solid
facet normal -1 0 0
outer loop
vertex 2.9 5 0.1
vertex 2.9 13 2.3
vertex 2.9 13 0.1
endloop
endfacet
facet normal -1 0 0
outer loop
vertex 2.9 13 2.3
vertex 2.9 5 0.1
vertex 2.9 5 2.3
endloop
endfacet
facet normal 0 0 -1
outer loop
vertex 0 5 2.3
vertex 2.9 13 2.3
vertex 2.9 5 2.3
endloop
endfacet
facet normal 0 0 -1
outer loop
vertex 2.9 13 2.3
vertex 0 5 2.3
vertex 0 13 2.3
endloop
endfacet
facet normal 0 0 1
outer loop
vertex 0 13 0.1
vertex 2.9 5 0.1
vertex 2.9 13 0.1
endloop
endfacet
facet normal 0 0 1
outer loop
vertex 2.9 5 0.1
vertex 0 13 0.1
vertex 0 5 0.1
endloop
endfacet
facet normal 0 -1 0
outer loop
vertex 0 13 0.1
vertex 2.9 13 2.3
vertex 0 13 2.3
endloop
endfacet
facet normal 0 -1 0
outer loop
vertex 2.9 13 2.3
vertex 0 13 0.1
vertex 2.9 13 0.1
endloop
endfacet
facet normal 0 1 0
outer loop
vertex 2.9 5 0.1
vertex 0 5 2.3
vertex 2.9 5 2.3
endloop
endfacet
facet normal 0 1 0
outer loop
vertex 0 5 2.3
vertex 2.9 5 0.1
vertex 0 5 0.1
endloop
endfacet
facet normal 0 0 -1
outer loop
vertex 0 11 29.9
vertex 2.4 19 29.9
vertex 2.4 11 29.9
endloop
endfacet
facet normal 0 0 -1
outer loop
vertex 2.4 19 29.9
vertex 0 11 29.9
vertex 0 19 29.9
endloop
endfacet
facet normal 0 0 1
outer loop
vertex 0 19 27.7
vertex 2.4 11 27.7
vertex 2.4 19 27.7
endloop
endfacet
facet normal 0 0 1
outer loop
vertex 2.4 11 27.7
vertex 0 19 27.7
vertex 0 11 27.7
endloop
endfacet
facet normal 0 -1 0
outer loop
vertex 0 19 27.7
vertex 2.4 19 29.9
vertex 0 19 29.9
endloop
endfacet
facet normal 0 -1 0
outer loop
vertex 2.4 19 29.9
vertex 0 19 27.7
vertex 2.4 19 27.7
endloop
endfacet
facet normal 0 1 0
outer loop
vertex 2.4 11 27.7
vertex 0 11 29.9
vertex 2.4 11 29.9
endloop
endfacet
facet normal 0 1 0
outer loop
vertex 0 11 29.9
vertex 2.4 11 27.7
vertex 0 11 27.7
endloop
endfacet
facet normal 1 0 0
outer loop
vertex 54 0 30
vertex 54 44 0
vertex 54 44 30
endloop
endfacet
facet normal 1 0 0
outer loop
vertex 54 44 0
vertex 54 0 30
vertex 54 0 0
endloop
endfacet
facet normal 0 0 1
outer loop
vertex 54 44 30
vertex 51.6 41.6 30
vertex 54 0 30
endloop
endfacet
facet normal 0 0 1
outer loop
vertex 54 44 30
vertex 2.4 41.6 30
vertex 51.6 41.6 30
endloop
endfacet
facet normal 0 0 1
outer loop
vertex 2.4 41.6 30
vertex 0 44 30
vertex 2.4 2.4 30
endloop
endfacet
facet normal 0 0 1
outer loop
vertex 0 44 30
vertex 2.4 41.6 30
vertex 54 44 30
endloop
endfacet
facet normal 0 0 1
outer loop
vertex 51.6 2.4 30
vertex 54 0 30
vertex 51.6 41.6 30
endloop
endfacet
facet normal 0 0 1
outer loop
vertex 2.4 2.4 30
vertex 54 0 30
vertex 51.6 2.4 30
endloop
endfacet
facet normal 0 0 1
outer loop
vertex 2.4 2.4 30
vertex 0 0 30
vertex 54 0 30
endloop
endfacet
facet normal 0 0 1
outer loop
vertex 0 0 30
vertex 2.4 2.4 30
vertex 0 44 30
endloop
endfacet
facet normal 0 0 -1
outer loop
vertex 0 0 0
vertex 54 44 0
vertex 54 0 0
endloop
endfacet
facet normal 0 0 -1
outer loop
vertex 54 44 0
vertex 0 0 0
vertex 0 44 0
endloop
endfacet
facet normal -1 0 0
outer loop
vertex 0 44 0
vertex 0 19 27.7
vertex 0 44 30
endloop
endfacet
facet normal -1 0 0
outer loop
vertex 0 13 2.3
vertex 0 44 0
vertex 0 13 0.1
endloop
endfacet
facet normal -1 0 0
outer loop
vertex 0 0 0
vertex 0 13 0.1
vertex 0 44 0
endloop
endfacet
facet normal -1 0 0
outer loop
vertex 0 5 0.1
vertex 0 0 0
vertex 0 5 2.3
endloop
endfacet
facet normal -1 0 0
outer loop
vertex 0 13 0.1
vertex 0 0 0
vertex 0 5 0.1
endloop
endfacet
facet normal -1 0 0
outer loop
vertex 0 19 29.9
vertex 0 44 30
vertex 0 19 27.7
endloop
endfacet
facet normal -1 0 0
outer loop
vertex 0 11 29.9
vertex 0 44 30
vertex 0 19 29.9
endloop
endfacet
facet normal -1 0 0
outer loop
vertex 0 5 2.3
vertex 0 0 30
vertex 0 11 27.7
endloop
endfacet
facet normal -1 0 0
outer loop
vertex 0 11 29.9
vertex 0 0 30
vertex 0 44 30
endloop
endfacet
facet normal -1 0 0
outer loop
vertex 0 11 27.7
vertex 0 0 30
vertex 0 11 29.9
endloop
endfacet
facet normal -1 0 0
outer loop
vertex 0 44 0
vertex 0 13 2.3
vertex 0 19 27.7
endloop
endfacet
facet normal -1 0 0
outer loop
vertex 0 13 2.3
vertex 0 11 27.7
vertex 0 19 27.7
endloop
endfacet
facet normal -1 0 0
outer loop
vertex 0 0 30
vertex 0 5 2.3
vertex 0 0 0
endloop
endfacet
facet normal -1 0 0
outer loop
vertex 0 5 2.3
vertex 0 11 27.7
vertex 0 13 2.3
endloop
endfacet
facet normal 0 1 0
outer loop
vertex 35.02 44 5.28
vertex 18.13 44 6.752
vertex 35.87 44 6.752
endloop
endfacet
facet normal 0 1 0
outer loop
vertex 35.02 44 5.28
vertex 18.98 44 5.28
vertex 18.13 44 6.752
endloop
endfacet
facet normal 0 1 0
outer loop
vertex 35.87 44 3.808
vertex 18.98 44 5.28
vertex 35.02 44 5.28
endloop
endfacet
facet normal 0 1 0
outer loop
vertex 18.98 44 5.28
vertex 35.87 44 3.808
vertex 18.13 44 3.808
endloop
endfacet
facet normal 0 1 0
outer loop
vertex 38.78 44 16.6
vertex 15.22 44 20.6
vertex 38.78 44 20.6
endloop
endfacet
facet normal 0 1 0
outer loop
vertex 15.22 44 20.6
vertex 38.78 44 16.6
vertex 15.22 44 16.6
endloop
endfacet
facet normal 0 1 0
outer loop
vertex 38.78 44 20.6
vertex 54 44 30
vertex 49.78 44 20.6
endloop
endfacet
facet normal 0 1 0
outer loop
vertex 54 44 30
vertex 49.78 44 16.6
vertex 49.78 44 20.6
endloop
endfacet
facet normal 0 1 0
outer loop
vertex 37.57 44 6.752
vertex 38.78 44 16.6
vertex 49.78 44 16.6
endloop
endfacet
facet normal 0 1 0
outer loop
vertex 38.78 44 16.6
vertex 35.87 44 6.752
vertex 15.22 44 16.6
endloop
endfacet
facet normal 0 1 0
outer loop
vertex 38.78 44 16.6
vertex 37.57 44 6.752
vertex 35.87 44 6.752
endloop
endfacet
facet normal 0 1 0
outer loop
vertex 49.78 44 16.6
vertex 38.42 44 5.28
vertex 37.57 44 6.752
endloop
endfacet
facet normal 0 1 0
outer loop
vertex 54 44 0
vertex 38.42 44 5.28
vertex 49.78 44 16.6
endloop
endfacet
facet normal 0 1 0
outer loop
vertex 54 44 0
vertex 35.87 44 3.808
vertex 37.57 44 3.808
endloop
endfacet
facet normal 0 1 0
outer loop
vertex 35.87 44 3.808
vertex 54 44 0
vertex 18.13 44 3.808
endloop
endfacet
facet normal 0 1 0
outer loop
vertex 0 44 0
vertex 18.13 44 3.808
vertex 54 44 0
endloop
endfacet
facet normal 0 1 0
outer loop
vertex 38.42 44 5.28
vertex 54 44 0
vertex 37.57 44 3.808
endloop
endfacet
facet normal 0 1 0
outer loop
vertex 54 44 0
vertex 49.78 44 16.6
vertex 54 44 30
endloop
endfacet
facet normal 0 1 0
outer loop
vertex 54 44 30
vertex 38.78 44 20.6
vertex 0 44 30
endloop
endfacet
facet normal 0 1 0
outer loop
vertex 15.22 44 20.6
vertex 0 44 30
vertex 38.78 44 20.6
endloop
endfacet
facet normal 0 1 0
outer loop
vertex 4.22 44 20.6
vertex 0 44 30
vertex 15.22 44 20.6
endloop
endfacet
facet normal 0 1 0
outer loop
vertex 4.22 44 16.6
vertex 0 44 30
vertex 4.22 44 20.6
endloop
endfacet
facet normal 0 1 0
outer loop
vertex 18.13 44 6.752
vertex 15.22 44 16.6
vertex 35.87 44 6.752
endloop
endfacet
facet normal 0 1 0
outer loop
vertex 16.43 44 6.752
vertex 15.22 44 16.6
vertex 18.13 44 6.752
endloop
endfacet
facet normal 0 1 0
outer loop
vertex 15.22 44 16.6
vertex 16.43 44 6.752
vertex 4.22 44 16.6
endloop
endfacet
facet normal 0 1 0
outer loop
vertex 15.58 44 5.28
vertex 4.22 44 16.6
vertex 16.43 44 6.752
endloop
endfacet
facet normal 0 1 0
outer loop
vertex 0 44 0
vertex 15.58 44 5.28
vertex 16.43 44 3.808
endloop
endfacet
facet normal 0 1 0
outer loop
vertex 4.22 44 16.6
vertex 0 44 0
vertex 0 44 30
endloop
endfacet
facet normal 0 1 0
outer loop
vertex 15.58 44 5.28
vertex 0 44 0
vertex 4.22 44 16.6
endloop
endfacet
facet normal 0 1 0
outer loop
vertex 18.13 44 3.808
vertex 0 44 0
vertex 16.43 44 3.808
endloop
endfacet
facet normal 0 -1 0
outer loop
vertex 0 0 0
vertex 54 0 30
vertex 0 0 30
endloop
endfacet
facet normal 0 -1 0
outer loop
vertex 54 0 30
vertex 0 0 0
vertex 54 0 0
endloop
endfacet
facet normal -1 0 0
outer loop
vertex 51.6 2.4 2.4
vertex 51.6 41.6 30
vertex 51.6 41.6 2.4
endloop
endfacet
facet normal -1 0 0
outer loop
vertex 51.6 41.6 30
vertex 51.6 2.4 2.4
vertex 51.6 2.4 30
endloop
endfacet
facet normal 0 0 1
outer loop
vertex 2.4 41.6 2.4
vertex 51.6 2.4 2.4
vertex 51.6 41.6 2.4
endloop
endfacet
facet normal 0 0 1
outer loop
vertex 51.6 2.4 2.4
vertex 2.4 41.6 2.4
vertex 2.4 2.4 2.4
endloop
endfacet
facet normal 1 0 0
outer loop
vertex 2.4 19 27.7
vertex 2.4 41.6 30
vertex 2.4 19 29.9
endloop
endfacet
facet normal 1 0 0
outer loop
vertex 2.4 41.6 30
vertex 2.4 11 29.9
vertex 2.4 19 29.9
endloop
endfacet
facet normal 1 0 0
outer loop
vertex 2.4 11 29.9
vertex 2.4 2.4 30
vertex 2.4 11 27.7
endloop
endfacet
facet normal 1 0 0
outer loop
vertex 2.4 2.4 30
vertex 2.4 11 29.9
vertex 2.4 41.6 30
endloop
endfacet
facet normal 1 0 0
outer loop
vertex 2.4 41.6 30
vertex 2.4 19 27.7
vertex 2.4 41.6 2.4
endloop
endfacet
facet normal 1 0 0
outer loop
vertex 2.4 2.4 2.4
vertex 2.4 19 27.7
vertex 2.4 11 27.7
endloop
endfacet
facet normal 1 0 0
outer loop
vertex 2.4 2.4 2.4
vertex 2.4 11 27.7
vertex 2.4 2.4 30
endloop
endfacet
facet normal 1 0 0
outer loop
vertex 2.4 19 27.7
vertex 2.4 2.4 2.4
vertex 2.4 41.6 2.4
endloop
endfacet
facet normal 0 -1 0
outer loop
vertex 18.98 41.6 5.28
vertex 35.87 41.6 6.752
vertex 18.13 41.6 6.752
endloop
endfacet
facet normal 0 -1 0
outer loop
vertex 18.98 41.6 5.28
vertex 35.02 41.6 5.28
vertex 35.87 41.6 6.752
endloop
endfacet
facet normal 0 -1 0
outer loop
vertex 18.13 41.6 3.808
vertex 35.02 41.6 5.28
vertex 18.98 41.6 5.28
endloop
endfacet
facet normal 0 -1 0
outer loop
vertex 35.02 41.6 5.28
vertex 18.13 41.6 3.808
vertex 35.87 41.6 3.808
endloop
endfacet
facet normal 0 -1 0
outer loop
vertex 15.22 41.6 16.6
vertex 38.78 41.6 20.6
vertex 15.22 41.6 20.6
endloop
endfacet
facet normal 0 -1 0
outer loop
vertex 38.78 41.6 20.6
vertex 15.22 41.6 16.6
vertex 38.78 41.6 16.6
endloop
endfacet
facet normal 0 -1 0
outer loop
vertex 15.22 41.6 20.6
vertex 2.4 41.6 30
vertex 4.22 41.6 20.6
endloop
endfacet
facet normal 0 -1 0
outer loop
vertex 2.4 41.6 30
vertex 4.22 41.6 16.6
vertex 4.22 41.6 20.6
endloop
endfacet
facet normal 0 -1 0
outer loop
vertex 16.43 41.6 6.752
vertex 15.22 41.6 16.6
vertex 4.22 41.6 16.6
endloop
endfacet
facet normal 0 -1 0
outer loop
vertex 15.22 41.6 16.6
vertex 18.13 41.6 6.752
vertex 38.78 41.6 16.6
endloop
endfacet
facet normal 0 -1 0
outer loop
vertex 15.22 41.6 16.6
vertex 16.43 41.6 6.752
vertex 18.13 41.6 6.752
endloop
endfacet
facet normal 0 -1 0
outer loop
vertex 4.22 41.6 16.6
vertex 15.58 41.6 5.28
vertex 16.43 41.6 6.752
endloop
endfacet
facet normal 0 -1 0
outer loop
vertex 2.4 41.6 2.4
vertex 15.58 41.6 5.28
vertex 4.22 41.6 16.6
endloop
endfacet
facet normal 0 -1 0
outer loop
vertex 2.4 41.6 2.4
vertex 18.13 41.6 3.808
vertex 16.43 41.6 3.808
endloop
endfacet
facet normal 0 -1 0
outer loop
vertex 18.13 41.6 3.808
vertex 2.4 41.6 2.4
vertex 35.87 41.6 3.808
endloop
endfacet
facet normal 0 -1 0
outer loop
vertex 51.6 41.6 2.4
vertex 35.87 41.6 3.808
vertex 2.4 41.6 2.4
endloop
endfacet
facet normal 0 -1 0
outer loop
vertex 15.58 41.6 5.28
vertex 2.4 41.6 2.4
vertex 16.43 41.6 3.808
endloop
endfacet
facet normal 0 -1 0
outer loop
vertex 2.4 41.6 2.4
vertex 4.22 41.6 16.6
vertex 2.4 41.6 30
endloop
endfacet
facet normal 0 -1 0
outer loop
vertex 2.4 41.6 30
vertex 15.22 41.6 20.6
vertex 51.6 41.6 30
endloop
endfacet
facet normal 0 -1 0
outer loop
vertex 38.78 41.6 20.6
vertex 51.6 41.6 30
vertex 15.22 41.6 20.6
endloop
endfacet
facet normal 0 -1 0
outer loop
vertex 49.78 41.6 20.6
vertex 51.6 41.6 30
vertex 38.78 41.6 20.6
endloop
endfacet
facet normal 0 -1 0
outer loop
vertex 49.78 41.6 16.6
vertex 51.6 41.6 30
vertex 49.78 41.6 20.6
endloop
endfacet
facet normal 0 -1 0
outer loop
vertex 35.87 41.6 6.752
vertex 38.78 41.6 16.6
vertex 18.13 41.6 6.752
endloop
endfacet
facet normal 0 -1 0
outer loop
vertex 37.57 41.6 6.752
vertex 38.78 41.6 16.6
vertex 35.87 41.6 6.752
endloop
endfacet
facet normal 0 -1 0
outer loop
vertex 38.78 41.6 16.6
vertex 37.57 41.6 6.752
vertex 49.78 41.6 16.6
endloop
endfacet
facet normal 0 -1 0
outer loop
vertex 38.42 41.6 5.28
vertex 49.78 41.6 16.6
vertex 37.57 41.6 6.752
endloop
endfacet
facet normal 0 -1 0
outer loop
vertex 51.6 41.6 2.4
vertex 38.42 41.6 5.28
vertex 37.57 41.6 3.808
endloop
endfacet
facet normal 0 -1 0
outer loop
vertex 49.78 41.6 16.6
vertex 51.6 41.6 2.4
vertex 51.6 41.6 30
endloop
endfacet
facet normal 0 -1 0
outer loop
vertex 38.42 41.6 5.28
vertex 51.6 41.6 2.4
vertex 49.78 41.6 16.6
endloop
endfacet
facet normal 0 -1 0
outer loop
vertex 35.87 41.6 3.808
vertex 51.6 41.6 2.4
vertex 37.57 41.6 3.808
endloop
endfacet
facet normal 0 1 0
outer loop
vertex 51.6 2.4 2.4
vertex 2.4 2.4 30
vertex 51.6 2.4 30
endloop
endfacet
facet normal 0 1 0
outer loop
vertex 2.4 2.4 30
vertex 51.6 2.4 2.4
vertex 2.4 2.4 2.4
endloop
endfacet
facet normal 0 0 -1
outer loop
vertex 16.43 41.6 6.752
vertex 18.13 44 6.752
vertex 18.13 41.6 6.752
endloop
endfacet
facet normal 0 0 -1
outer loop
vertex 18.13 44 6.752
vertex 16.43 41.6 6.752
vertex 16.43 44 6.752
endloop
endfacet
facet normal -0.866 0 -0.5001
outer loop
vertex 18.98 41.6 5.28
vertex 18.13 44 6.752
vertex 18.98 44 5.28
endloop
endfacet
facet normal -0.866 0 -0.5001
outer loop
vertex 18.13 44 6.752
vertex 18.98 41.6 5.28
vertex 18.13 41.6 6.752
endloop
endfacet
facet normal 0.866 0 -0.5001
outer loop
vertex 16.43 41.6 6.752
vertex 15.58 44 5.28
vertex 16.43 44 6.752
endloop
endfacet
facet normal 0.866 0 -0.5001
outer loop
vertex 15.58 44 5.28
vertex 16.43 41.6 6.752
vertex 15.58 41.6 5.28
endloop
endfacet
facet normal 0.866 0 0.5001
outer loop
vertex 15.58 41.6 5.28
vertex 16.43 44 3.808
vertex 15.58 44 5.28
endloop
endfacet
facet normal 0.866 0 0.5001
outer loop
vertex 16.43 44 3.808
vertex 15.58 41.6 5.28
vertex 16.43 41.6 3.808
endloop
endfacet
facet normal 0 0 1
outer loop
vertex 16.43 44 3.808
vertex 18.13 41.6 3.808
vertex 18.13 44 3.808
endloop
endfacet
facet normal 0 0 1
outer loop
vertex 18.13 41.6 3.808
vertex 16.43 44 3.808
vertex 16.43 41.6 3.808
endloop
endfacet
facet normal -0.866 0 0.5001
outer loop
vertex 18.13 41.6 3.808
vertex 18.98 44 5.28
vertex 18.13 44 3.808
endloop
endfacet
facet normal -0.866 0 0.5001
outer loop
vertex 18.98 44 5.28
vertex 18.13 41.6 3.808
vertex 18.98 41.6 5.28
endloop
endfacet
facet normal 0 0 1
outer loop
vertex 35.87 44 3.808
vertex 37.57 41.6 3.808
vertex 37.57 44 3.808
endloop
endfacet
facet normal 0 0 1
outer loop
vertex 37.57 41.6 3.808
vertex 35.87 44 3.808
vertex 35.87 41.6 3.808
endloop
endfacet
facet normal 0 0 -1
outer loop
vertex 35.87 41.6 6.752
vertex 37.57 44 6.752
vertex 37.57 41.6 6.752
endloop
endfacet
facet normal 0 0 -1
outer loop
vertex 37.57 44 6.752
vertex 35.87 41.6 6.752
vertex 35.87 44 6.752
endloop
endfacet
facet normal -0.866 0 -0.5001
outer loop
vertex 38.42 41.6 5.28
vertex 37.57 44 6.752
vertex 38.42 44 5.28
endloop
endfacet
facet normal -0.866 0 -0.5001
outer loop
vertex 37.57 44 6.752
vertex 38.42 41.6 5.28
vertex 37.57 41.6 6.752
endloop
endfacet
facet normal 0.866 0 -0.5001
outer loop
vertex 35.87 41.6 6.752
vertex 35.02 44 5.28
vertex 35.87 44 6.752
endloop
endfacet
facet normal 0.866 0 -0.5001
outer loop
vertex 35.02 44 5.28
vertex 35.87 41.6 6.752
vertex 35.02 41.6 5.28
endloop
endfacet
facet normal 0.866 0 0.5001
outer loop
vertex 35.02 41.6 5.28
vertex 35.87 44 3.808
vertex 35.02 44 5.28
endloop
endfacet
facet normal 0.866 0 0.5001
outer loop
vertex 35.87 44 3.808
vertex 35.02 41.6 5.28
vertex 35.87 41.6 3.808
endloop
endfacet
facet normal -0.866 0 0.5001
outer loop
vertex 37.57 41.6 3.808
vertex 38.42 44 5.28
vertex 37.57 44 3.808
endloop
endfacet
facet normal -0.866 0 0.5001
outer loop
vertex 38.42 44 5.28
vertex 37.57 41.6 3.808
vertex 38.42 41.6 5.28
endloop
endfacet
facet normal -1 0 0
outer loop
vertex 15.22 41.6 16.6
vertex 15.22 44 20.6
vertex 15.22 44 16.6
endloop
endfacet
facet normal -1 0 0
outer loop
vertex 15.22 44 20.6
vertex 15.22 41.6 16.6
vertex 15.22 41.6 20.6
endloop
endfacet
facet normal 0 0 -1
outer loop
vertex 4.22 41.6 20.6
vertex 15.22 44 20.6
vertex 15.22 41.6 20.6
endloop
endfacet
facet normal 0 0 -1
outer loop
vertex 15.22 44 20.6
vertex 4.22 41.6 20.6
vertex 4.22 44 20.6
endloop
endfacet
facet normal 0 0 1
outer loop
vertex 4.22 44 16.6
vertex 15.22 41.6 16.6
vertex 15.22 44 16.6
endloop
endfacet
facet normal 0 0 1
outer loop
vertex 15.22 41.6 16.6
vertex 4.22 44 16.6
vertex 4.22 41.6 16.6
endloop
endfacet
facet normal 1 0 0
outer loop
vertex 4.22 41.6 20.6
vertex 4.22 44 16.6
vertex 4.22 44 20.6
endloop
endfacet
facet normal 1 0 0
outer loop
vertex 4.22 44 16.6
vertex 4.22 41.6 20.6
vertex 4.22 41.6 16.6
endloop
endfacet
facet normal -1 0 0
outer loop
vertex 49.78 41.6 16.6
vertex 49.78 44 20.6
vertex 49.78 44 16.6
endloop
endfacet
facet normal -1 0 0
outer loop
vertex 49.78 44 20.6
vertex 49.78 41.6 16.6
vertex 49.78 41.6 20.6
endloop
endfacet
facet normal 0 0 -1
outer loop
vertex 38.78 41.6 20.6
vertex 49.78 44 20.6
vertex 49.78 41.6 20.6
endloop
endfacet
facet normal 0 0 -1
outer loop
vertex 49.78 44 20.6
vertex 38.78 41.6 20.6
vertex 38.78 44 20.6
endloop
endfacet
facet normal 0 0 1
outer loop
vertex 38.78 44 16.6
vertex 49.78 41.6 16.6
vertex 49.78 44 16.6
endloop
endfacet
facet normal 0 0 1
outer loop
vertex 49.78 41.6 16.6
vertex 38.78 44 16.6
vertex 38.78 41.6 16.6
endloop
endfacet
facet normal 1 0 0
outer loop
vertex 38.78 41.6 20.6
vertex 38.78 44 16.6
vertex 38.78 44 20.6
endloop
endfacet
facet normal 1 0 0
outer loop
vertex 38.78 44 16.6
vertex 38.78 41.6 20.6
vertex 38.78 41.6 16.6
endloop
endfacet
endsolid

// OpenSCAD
// ============================================================
// Stenovy box — ESP32-C6 supermini + SHT40 + SCD40 + buck
// Tisk: PLA nebo PETG, 3 steny, 20% infill, bez supportu.
// OpenSCAD: F6 (Render) -> File > Export STL.
// POZOR: pred montazi over rozmery sve desky a posun otvoru.
// ============================================================

/* [Core] */
L = 54;             // delka X (mm)
W = 44;             // hloubka Y
H = 30;             // vyska Z
wall = 2.4;         // tlousta steny
lid_t = 2.5;        // tloustka veka
screw_d = 2.8;      // predvrt pod M3 samorez (PLA 2.8, PETG 2.6)
clearance = 0.3;

/* [Vents] */
vent_slot = 8;      // delka vetraci sterbiny
vent_w = 2.2;       // sirka sterbiny

module body() {
  difference() {
    cube([L, W, H]);
    // dutina od dna po horni okraj (veko samostatne)
    translate([wall, wall, wall])
      cube([L - 2*wall, W - 2*wall, H - wall + clearance]);
    // kabelove pruchodky vzadu dole (dvoulinka ke stenovemu boxu)
    translate([L*0.32, W - wall/2, wall*2.2]) rotate([90,0,0])
      cylinder(h = wall*2 + 0.4, d = 3.4, center = true);
    translate([L*0.68, W - wall/2, wall*2.2]) rotate([90,0,0])
      cylinder(h = wall*2 + 0.4, d = 3.4, center = true);
    // montazni otvory na zed (vyrez do zadni steny, 2x)
    translate([L*0.18, W - wall/2, H*0.62]) cube([11, wall + 0.4, 4], center = true);
    translate([L*0.82, W - wall/2, H*0.62]) cube([11, wall + 0.4, 4], center = true);
    // vetraci sterbiny: predni + zadni stena, spodni pas
    for (r = [0:2]) {
      ty = 5 + r * (vent_slot + 3);
      if (ty + vent_slot < H - 6) {
        translate([-0.5, ty, wall/2 - vent_w/2]) cube([wall + 1, vent_slot, vent_w]);
        translate([-0.5, H - 6 - ty - vent_slot, H - wall/2 - vent_w/2])
          cube([wall + 1, vent_slot, vent_w]);
      }
    }
  }
}

// rohy se zapustenym predvrtem pro sroubky veka
module posts() {
  for (x = [wall + 3.8, L - wall - 3.8], y = [wall + 3.8, W - wall - 3.8]) {
    difference() {
      translate([x - 3, y - 3, wall]) cube([6, 6, H - wall - 0.01]);
      translate([x, y, wall - 0.5]) cylinder(h = H - wall + 1, d = screw_d);
    }
  }
}

module lid() {
  difference() {
    cube([L, W, lid_t]);
    for (x = [wall + 3.8, L - wall - 3.8], y = [wall + 3.8, W - wall - 3.8])
      translate([x, y, -0.5]) cylinder(h = lid_t + 1, d = screw_d + 0.6);
    // odvetravani navrch (CO2/c6 teple stoupá — mirna mriezka)
    for (r = [0:1])
      translate([L*0.3 + r*L*0.4, 6, -0.01])
        cube([vent_slot, W - 12, lid_t + 0.2], center = false);
  }
}

/* [Render] */
mode = 0; // 0 = body (tisk doly na stul), 1 = viko, 2 = nahled vse

if (mode == 0) body();
else if (mode == 1) translate([0, 0, 0]) lid();
else { body(); translate([L + 8, 0, 0]) lid(); }
